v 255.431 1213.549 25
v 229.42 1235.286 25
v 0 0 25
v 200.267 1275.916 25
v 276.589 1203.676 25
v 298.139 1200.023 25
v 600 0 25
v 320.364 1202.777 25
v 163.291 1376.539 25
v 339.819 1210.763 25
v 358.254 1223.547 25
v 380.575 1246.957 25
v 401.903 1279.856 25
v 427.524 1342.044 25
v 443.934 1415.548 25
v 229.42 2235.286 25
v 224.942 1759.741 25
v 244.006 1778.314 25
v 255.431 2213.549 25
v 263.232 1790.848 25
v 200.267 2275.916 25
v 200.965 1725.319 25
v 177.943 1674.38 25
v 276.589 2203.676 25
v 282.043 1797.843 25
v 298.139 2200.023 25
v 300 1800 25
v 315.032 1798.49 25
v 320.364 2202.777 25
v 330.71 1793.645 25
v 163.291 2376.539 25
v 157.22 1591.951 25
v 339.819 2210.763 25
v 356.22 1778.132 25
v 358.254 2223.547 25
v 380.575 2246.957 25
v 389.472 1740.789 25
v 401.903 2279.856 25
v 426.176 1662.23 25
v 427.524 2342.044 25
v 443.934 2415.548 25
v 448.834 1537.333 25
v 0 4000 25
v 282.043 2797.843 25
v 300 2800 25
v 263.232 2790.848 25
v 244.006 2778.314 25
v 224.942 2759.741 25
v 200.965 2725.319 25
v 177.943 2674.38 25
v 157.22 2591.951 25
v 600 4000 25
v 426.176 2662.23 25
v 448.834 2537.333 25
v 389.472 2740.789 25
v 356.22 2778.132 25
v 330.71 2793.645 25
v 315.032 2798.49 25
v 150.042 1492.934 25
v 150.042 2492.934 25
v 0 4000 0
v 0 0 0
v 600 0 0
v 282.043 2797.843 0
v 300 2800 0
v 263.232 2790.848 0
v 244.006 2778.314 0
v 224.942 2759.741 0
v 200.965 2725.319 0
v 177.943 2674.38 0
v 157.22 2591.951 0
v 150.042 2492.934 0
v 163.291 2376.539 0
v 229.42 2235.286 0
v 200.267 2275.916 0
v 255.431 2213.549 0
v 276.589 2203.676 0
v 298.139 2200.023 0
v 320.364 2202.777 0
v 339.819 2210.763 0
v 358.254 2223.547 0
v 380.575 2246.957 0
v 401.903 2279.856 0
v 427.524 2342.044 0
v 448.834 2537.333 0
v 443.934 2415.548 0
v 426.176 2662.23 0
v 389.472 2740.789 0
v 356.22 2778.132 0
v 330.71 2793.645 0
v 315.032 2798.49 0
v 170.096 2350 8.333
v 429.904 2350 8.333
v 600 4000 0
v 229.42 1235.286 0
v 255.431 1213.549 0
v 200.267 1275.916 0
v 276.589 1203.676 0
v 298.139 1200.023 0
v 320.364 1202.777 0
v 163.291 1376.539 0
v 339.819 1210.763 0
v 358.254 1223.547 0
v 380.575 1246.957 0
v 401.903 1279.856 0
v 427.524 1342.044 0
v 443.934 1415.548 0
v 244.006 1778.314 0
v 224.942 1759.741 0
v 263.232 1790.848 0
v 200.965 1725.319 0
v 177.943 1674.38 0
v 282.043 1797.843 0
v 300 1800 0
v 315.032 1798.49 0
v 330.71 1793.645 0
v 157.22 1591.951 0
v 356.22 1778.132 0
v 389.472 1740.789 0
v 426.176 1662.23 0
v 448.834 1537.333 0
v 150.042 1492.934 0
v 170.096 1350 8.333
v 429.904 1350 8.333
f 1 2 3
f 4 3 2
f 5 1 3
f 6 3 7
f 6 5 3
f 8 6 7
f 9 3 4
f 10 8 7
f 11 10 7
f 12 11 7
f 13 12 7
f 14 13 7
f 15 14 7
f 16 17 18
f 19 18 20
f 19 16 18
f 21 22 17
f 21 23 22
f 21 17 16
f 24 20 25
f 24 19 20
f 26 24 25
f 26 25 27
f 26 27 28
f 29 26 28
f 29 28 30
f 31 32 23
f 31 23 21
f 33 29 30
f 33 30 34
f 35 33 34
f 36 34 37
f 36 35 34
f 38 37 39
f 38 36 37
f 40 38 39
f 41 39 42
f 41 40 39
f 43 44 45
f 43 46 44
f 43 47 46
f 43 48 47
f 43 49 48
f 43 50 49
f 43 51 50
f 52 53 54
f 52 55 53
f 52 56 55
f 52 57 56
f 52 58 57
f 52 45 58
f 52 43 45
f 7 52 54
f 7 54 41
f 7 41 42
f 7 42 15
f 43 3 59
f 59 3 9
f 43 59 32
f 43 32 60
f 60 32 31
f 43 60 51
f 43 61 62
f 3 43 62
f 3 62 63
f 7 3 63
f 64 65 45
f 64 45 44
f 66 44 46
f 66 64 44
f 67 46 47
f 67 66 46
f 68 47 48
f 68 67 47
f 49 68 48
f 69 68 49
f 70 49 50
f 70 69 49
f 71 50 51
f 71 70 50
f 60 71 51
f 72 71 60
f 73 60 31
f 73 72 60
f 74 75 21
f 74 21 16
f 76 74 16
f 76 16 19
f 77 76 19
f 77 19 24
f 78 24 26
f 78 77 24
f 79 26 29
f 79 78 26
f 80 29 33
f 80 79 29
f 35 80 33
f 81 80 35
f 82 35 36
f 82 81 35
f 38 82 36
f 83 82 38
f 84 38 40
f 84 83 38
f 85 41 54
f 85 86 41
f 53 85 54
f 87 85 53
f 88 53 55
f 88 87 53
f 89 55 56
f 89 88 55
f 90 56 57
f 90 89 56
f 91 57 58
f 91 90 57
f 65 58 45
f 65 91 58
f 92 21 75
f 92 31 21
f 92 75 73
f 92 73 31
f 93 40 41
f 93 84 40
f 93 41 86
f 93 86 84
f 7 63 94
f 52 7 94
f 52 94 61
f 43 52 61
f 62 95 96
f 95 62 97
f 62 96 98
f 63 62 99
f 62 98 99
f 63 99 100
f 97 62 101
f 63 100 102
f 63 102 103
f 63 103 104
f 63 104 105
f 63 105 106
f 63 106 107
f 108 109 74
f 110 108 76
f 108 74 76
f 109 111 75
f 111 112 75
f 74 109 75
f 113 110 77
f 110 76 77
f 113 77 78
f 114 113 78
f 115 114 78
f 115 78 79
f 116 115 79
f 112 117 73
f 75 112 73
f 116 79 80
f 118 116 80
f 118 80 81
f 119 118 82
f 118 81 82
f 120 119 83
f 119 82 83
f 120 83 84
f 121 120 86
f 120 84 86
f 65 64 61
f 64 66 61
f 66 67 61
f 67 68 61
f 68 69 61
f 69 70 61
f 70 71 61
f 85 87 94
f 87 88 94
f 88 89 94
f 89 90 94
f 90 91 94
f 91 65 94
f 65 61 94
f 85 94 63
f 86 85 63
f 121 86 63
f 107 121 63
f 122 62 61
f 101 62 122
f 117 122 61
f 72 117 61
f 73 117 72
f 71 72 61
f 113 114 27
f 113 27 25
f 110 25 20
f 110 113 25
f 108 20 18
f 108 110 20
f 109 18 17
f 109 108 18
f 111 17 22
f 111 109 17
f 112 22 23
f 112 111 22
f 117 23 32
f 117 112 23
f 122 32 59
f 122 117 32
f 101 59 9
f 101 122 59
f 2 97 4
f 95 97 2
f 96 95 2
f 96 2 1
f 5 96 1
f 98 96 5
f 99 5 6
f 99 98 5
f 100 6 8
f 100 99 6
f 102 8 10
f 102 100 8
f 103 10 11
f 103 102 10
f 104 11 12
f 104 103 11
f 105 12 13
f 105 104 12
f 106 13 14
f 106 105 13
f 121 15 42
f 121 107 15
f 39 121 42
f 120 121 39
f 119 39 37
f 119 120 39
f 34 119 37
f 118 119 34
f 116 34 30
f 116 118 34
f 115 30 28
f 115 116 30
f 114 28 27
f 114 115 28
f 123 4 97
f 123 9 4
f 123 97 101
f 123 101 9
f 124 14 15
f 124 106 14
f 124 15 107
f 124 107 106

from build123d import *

# Parameters (mm, degrees)
F1_DEPTH = 25


with BuildPart() as f1:
    # F0 (on Top) → F1 (new body)
    with BuildSketch(Plane.XY):
        with BuildLine():
            Line((0, 3000), (0, 0))
            Line((0, 0), (600, 0))
            Line((600, 0), (600, 186.54424))
            ThreePointArc((600, 186.54424), (450, 336.54424), (600, 486.54424))
            Line((600, 486.54424), (600, 583.93681))
            ThreePointArc((600, 583.93681), (450, 733.93681), (600, 883.93681))
            Line((600, 883.93681), (600, 4000))
            Line((600, 4000), (0, 4000))
            Line((0, 4000), (0, 3100))
            Line((0, 3100), (150, 3100))
            ThreePointArc((150, 3100), (250, 3000), (150, 2900))
            ThreePointArc((150, 2900), (79.289322, 2929.289322), (50, 3000))
            Line((50, 3000), (0, 3000))
        make_face()
        with BuildLine():
            add(Edge.make_bspline(
                [(300, 1800), (40.192379, 1800), (170.096189, 1350), (300, 900), (429.903811, 1350), (559.807621, 1800), (300, 1800)],
                knots=[0, 0, 0, 2.094395, 2.094395, 4.18879, 4.18879, 6.283185, 6.283185, 6.283185], degree=2, weights=[1, 0.5, 1, 0.5, 1, 0.5, 1]))
        make_face(mode=Mode.SUBTRACT)
        with BuildLine():
            add(Edge.make_bspline(
                [(300, 2800), (40.192379, 2800), (170.096189, 2350), (300, 1900), (429.903811, 2350), (559.807621, 2800), (300, 2800)],
                knots=[0, 0, 0, 2.094395, 2.094395, 4.18879, 4.18879, 6.283185, 6.283185, 6.283185], degree=2, weights=[1, 0.5, 1, 0.5, 1, 0.5, 1]))
        make_face(mode=Mode.SUBTRACT)
        with BuildLine():
            Line((0, 3100), (0, 3000))
            Line((0, 3000), (50, 3000))
            ThreePointArc((50, 3000), (79.289322, 2929.289322), (150, 2900))
            ThreePointArc((150, 2900), (250, 3000), (150, 3100))
            Line((150, 3100), (0, 3100))
        make_face()
        with BuildLine():
            ThreePointArc((600, 883.93681), (450, 733.93681), (600, 583.93681))
            Line((600, 583.93681), (600, 883.93681))
        make_face()
        with BuildLine():
            ThreePointArc((600, 486.54424), (450, 336.54424), (600, 186.54424))
            Line((600, 186.54424), (600, 486.54424))
        make_face()
    extrude(amount=F1_DEPTH)


solid = f1.part
